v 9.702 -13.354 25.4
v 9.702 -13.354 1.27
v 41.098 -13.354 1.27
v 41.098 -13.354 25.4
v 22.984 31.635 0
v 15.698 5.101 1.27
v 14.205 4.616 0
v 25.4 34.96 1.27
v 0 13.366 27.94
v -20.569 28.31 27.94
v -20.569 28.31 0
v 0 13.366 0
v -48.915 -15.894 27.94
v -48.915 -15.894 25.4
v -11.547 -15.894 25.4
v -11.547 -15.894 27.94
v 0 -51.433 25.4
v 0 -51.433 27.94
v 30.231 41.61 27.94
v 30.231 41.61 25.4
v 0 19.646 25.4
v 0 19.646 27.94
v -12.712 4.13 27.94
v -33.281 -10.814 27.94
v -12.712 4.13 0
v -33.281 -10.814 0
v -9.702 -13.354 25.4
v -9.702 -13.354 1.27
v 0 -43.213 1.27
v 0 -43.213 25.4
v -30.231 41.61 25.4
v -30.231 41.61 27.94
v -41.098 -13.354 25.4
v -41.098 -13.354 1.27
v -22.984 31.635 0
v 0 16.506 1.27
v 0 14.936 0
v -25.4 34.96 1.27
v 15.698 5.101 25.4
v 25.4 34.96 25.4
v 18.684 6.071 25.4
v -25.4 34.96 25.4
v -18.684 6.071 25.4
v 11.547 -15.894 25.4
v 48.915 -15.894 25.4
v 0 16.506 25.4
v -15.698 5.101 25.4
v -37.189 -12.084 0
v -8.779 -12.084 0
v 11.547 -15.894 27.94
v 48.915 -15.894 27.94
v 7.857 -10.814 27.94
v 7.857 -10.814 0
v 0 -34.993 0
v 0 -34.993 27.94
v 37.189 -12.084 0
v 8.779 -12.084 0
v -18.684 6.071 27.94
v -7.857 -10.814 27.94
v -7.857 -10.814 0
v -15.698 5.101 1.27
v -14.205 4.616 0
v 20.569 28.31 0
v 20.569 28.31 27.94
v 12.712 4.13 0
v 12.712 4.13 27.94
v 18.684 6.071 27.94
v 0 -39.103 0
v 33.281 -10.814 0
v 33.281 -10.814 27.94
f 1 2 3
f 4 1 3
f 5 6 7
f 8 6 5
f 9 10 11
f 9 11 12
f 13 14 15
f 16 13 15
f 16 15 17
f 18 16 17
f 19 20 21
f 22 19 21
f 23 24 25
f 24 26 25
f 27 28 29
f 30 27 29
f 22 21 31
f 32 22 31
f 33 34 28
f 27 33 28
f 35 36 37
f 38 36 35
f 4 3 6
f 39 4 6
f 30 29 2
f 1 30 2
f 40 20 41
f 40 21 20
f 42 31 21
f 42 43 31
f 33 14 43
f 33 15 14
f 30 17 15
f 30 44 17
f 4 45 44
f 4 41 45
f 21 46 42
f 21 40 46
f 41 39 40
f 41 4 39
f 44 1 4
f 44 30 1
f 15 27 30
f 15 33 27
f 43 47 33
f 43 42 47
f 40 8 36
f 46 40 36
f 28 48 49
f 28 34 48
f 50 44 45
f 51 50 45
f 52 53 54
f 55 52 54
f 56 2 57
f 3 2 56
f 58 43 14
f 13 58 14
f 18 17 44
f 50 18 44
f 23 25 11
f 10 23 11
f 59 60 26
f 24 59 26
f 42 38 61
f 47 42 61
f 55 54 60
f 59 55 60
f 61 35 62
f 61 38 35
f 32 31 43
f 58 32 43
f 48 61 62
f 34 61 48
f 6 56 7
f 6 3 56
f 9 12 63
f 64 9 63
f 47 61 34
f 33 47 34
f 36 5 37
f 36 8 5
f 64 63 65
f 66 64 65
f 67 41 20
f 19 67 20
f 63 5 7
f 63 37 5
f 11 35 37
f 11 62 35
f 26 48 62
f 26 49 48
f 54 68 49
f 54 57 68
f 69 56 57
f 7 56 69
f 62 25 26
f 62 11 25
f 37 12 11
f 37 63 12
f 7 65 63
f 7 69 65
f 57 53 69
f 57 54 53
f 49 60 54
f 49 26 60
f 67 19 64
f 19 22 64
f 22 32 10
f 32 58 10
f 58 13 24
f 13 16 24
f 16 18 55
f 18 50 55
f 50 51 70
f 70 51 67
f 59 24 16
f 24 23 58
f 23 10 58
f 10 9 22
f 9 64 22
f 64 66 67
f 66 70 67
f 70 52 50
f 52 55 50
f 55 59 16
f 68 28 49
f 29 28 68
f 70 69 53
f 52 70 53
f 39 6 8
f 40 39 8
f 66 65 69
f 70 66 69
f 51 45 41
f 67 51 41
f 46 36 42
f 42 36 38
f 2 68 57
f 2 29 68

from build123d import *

# Parameters (mm, degrees)
F1_DEPTH = 25.4
F3_DEPTH = 2.54
F4_SIZE  = 1.27


with BuildPart() as f1:
    # F0 (on Top) → F1 (new body)
    with BuildSketch(Plane.XY):
        Polygon((0, 16.505921), (-25.4, 34.960101), (-15.698063, 5.10061), (-41.098063, -13.35357), (-9.701937, -13.35357), (0, -43.213061), (9.701937, -13.35357), (41.098063, -13.35357), (15.698063, 5.10061), (25.4, 34.960101), align=None)
        Polygon((-12.712114, 4.130416), (-20.568633, 28.310294), (0, 13.366308), (20.568633, 28.310294), (12.712114, 4.130416), (33.280747, -10.81357), (7.856519, -10.81357), (0, -34.993448), (-7.856519, -10.81357), (-33.280747, -10.81357), align=None, mode=Mode.SUBTRACT)
    extrude(amount=F1_DEPTH)

    # F2 (on face) → F3 (join)
    with BuildSketch(Plane.XY.offset(25.4)):
        Polygon((18.684012, 6.070804), (30.231367, 41.609907), (0, 19.645533), (-30.231367, 41.609907), (-18.684012, 6.070804), (-48.915379, -15.89357), (-11.547355, -15.89357), (0, -51.432674), (11.547355, -15.89357), (48.915379, -15.89357), align=None)
        Polygon((0, 16.505921), (25.4, 34.960101), (15.698063, 5.10061), (41.098063, -13.35357), (9.701937, -13.35357), (0, -43.213061), (-9.701937, -13.35357), (-41.098063, -13.35357), (-15.698063, 5.10061), (-25.4, 34.960101), align=None, mode=Mode.SUBTRACT)
        Polygon((15.698063, 5.10061), (25.4, 34.960101), (0, 16.505921), (-25.4, 34.960101), (-15.698063, 5.10061), (-41.098063, -13.35357), (-9.701937, -13.35357), (0, -43.213061), (9.701937, -13.35357), (41.098063, -13.35357), align=None)
        Polygon((-33.280747, -10.81357), (-12.712114, 4.130416), (-20.568633, 28.310294), (0, 13.366308), (20.568633, 28.310294), (12.712114, 4.130416), (33.280747, -10.81357), (7.856519, -10.81357), (0, -34.993448), (-7.856519, -10.81357), align=None, mode=Mode.SUBTRACT)
    extrude(amount=F3_DEPTH)

    # F4
    f4_edges = [f1.edges().sort_by_distance(p)[0] for p in [
        (20.549032, 20.030355, 0),
        (12.7, 25.733011, 0),
        (-12.7, 25.733011, 0),
        (-20.549032, 20.030355, 0),
        (-28.398063, -4.12648, 0),
        (-25.4, -13.35357, 0),
        (-4.850968, -28.283316, 0),
        (4.850968, -28.283316, 0),
        (25.4, -13.35357, 0),
        (28.398063, -4.12648, 0),
    ]]
    chamfer(f4_edges, length=F4_SIZE)


solid = f1.part
